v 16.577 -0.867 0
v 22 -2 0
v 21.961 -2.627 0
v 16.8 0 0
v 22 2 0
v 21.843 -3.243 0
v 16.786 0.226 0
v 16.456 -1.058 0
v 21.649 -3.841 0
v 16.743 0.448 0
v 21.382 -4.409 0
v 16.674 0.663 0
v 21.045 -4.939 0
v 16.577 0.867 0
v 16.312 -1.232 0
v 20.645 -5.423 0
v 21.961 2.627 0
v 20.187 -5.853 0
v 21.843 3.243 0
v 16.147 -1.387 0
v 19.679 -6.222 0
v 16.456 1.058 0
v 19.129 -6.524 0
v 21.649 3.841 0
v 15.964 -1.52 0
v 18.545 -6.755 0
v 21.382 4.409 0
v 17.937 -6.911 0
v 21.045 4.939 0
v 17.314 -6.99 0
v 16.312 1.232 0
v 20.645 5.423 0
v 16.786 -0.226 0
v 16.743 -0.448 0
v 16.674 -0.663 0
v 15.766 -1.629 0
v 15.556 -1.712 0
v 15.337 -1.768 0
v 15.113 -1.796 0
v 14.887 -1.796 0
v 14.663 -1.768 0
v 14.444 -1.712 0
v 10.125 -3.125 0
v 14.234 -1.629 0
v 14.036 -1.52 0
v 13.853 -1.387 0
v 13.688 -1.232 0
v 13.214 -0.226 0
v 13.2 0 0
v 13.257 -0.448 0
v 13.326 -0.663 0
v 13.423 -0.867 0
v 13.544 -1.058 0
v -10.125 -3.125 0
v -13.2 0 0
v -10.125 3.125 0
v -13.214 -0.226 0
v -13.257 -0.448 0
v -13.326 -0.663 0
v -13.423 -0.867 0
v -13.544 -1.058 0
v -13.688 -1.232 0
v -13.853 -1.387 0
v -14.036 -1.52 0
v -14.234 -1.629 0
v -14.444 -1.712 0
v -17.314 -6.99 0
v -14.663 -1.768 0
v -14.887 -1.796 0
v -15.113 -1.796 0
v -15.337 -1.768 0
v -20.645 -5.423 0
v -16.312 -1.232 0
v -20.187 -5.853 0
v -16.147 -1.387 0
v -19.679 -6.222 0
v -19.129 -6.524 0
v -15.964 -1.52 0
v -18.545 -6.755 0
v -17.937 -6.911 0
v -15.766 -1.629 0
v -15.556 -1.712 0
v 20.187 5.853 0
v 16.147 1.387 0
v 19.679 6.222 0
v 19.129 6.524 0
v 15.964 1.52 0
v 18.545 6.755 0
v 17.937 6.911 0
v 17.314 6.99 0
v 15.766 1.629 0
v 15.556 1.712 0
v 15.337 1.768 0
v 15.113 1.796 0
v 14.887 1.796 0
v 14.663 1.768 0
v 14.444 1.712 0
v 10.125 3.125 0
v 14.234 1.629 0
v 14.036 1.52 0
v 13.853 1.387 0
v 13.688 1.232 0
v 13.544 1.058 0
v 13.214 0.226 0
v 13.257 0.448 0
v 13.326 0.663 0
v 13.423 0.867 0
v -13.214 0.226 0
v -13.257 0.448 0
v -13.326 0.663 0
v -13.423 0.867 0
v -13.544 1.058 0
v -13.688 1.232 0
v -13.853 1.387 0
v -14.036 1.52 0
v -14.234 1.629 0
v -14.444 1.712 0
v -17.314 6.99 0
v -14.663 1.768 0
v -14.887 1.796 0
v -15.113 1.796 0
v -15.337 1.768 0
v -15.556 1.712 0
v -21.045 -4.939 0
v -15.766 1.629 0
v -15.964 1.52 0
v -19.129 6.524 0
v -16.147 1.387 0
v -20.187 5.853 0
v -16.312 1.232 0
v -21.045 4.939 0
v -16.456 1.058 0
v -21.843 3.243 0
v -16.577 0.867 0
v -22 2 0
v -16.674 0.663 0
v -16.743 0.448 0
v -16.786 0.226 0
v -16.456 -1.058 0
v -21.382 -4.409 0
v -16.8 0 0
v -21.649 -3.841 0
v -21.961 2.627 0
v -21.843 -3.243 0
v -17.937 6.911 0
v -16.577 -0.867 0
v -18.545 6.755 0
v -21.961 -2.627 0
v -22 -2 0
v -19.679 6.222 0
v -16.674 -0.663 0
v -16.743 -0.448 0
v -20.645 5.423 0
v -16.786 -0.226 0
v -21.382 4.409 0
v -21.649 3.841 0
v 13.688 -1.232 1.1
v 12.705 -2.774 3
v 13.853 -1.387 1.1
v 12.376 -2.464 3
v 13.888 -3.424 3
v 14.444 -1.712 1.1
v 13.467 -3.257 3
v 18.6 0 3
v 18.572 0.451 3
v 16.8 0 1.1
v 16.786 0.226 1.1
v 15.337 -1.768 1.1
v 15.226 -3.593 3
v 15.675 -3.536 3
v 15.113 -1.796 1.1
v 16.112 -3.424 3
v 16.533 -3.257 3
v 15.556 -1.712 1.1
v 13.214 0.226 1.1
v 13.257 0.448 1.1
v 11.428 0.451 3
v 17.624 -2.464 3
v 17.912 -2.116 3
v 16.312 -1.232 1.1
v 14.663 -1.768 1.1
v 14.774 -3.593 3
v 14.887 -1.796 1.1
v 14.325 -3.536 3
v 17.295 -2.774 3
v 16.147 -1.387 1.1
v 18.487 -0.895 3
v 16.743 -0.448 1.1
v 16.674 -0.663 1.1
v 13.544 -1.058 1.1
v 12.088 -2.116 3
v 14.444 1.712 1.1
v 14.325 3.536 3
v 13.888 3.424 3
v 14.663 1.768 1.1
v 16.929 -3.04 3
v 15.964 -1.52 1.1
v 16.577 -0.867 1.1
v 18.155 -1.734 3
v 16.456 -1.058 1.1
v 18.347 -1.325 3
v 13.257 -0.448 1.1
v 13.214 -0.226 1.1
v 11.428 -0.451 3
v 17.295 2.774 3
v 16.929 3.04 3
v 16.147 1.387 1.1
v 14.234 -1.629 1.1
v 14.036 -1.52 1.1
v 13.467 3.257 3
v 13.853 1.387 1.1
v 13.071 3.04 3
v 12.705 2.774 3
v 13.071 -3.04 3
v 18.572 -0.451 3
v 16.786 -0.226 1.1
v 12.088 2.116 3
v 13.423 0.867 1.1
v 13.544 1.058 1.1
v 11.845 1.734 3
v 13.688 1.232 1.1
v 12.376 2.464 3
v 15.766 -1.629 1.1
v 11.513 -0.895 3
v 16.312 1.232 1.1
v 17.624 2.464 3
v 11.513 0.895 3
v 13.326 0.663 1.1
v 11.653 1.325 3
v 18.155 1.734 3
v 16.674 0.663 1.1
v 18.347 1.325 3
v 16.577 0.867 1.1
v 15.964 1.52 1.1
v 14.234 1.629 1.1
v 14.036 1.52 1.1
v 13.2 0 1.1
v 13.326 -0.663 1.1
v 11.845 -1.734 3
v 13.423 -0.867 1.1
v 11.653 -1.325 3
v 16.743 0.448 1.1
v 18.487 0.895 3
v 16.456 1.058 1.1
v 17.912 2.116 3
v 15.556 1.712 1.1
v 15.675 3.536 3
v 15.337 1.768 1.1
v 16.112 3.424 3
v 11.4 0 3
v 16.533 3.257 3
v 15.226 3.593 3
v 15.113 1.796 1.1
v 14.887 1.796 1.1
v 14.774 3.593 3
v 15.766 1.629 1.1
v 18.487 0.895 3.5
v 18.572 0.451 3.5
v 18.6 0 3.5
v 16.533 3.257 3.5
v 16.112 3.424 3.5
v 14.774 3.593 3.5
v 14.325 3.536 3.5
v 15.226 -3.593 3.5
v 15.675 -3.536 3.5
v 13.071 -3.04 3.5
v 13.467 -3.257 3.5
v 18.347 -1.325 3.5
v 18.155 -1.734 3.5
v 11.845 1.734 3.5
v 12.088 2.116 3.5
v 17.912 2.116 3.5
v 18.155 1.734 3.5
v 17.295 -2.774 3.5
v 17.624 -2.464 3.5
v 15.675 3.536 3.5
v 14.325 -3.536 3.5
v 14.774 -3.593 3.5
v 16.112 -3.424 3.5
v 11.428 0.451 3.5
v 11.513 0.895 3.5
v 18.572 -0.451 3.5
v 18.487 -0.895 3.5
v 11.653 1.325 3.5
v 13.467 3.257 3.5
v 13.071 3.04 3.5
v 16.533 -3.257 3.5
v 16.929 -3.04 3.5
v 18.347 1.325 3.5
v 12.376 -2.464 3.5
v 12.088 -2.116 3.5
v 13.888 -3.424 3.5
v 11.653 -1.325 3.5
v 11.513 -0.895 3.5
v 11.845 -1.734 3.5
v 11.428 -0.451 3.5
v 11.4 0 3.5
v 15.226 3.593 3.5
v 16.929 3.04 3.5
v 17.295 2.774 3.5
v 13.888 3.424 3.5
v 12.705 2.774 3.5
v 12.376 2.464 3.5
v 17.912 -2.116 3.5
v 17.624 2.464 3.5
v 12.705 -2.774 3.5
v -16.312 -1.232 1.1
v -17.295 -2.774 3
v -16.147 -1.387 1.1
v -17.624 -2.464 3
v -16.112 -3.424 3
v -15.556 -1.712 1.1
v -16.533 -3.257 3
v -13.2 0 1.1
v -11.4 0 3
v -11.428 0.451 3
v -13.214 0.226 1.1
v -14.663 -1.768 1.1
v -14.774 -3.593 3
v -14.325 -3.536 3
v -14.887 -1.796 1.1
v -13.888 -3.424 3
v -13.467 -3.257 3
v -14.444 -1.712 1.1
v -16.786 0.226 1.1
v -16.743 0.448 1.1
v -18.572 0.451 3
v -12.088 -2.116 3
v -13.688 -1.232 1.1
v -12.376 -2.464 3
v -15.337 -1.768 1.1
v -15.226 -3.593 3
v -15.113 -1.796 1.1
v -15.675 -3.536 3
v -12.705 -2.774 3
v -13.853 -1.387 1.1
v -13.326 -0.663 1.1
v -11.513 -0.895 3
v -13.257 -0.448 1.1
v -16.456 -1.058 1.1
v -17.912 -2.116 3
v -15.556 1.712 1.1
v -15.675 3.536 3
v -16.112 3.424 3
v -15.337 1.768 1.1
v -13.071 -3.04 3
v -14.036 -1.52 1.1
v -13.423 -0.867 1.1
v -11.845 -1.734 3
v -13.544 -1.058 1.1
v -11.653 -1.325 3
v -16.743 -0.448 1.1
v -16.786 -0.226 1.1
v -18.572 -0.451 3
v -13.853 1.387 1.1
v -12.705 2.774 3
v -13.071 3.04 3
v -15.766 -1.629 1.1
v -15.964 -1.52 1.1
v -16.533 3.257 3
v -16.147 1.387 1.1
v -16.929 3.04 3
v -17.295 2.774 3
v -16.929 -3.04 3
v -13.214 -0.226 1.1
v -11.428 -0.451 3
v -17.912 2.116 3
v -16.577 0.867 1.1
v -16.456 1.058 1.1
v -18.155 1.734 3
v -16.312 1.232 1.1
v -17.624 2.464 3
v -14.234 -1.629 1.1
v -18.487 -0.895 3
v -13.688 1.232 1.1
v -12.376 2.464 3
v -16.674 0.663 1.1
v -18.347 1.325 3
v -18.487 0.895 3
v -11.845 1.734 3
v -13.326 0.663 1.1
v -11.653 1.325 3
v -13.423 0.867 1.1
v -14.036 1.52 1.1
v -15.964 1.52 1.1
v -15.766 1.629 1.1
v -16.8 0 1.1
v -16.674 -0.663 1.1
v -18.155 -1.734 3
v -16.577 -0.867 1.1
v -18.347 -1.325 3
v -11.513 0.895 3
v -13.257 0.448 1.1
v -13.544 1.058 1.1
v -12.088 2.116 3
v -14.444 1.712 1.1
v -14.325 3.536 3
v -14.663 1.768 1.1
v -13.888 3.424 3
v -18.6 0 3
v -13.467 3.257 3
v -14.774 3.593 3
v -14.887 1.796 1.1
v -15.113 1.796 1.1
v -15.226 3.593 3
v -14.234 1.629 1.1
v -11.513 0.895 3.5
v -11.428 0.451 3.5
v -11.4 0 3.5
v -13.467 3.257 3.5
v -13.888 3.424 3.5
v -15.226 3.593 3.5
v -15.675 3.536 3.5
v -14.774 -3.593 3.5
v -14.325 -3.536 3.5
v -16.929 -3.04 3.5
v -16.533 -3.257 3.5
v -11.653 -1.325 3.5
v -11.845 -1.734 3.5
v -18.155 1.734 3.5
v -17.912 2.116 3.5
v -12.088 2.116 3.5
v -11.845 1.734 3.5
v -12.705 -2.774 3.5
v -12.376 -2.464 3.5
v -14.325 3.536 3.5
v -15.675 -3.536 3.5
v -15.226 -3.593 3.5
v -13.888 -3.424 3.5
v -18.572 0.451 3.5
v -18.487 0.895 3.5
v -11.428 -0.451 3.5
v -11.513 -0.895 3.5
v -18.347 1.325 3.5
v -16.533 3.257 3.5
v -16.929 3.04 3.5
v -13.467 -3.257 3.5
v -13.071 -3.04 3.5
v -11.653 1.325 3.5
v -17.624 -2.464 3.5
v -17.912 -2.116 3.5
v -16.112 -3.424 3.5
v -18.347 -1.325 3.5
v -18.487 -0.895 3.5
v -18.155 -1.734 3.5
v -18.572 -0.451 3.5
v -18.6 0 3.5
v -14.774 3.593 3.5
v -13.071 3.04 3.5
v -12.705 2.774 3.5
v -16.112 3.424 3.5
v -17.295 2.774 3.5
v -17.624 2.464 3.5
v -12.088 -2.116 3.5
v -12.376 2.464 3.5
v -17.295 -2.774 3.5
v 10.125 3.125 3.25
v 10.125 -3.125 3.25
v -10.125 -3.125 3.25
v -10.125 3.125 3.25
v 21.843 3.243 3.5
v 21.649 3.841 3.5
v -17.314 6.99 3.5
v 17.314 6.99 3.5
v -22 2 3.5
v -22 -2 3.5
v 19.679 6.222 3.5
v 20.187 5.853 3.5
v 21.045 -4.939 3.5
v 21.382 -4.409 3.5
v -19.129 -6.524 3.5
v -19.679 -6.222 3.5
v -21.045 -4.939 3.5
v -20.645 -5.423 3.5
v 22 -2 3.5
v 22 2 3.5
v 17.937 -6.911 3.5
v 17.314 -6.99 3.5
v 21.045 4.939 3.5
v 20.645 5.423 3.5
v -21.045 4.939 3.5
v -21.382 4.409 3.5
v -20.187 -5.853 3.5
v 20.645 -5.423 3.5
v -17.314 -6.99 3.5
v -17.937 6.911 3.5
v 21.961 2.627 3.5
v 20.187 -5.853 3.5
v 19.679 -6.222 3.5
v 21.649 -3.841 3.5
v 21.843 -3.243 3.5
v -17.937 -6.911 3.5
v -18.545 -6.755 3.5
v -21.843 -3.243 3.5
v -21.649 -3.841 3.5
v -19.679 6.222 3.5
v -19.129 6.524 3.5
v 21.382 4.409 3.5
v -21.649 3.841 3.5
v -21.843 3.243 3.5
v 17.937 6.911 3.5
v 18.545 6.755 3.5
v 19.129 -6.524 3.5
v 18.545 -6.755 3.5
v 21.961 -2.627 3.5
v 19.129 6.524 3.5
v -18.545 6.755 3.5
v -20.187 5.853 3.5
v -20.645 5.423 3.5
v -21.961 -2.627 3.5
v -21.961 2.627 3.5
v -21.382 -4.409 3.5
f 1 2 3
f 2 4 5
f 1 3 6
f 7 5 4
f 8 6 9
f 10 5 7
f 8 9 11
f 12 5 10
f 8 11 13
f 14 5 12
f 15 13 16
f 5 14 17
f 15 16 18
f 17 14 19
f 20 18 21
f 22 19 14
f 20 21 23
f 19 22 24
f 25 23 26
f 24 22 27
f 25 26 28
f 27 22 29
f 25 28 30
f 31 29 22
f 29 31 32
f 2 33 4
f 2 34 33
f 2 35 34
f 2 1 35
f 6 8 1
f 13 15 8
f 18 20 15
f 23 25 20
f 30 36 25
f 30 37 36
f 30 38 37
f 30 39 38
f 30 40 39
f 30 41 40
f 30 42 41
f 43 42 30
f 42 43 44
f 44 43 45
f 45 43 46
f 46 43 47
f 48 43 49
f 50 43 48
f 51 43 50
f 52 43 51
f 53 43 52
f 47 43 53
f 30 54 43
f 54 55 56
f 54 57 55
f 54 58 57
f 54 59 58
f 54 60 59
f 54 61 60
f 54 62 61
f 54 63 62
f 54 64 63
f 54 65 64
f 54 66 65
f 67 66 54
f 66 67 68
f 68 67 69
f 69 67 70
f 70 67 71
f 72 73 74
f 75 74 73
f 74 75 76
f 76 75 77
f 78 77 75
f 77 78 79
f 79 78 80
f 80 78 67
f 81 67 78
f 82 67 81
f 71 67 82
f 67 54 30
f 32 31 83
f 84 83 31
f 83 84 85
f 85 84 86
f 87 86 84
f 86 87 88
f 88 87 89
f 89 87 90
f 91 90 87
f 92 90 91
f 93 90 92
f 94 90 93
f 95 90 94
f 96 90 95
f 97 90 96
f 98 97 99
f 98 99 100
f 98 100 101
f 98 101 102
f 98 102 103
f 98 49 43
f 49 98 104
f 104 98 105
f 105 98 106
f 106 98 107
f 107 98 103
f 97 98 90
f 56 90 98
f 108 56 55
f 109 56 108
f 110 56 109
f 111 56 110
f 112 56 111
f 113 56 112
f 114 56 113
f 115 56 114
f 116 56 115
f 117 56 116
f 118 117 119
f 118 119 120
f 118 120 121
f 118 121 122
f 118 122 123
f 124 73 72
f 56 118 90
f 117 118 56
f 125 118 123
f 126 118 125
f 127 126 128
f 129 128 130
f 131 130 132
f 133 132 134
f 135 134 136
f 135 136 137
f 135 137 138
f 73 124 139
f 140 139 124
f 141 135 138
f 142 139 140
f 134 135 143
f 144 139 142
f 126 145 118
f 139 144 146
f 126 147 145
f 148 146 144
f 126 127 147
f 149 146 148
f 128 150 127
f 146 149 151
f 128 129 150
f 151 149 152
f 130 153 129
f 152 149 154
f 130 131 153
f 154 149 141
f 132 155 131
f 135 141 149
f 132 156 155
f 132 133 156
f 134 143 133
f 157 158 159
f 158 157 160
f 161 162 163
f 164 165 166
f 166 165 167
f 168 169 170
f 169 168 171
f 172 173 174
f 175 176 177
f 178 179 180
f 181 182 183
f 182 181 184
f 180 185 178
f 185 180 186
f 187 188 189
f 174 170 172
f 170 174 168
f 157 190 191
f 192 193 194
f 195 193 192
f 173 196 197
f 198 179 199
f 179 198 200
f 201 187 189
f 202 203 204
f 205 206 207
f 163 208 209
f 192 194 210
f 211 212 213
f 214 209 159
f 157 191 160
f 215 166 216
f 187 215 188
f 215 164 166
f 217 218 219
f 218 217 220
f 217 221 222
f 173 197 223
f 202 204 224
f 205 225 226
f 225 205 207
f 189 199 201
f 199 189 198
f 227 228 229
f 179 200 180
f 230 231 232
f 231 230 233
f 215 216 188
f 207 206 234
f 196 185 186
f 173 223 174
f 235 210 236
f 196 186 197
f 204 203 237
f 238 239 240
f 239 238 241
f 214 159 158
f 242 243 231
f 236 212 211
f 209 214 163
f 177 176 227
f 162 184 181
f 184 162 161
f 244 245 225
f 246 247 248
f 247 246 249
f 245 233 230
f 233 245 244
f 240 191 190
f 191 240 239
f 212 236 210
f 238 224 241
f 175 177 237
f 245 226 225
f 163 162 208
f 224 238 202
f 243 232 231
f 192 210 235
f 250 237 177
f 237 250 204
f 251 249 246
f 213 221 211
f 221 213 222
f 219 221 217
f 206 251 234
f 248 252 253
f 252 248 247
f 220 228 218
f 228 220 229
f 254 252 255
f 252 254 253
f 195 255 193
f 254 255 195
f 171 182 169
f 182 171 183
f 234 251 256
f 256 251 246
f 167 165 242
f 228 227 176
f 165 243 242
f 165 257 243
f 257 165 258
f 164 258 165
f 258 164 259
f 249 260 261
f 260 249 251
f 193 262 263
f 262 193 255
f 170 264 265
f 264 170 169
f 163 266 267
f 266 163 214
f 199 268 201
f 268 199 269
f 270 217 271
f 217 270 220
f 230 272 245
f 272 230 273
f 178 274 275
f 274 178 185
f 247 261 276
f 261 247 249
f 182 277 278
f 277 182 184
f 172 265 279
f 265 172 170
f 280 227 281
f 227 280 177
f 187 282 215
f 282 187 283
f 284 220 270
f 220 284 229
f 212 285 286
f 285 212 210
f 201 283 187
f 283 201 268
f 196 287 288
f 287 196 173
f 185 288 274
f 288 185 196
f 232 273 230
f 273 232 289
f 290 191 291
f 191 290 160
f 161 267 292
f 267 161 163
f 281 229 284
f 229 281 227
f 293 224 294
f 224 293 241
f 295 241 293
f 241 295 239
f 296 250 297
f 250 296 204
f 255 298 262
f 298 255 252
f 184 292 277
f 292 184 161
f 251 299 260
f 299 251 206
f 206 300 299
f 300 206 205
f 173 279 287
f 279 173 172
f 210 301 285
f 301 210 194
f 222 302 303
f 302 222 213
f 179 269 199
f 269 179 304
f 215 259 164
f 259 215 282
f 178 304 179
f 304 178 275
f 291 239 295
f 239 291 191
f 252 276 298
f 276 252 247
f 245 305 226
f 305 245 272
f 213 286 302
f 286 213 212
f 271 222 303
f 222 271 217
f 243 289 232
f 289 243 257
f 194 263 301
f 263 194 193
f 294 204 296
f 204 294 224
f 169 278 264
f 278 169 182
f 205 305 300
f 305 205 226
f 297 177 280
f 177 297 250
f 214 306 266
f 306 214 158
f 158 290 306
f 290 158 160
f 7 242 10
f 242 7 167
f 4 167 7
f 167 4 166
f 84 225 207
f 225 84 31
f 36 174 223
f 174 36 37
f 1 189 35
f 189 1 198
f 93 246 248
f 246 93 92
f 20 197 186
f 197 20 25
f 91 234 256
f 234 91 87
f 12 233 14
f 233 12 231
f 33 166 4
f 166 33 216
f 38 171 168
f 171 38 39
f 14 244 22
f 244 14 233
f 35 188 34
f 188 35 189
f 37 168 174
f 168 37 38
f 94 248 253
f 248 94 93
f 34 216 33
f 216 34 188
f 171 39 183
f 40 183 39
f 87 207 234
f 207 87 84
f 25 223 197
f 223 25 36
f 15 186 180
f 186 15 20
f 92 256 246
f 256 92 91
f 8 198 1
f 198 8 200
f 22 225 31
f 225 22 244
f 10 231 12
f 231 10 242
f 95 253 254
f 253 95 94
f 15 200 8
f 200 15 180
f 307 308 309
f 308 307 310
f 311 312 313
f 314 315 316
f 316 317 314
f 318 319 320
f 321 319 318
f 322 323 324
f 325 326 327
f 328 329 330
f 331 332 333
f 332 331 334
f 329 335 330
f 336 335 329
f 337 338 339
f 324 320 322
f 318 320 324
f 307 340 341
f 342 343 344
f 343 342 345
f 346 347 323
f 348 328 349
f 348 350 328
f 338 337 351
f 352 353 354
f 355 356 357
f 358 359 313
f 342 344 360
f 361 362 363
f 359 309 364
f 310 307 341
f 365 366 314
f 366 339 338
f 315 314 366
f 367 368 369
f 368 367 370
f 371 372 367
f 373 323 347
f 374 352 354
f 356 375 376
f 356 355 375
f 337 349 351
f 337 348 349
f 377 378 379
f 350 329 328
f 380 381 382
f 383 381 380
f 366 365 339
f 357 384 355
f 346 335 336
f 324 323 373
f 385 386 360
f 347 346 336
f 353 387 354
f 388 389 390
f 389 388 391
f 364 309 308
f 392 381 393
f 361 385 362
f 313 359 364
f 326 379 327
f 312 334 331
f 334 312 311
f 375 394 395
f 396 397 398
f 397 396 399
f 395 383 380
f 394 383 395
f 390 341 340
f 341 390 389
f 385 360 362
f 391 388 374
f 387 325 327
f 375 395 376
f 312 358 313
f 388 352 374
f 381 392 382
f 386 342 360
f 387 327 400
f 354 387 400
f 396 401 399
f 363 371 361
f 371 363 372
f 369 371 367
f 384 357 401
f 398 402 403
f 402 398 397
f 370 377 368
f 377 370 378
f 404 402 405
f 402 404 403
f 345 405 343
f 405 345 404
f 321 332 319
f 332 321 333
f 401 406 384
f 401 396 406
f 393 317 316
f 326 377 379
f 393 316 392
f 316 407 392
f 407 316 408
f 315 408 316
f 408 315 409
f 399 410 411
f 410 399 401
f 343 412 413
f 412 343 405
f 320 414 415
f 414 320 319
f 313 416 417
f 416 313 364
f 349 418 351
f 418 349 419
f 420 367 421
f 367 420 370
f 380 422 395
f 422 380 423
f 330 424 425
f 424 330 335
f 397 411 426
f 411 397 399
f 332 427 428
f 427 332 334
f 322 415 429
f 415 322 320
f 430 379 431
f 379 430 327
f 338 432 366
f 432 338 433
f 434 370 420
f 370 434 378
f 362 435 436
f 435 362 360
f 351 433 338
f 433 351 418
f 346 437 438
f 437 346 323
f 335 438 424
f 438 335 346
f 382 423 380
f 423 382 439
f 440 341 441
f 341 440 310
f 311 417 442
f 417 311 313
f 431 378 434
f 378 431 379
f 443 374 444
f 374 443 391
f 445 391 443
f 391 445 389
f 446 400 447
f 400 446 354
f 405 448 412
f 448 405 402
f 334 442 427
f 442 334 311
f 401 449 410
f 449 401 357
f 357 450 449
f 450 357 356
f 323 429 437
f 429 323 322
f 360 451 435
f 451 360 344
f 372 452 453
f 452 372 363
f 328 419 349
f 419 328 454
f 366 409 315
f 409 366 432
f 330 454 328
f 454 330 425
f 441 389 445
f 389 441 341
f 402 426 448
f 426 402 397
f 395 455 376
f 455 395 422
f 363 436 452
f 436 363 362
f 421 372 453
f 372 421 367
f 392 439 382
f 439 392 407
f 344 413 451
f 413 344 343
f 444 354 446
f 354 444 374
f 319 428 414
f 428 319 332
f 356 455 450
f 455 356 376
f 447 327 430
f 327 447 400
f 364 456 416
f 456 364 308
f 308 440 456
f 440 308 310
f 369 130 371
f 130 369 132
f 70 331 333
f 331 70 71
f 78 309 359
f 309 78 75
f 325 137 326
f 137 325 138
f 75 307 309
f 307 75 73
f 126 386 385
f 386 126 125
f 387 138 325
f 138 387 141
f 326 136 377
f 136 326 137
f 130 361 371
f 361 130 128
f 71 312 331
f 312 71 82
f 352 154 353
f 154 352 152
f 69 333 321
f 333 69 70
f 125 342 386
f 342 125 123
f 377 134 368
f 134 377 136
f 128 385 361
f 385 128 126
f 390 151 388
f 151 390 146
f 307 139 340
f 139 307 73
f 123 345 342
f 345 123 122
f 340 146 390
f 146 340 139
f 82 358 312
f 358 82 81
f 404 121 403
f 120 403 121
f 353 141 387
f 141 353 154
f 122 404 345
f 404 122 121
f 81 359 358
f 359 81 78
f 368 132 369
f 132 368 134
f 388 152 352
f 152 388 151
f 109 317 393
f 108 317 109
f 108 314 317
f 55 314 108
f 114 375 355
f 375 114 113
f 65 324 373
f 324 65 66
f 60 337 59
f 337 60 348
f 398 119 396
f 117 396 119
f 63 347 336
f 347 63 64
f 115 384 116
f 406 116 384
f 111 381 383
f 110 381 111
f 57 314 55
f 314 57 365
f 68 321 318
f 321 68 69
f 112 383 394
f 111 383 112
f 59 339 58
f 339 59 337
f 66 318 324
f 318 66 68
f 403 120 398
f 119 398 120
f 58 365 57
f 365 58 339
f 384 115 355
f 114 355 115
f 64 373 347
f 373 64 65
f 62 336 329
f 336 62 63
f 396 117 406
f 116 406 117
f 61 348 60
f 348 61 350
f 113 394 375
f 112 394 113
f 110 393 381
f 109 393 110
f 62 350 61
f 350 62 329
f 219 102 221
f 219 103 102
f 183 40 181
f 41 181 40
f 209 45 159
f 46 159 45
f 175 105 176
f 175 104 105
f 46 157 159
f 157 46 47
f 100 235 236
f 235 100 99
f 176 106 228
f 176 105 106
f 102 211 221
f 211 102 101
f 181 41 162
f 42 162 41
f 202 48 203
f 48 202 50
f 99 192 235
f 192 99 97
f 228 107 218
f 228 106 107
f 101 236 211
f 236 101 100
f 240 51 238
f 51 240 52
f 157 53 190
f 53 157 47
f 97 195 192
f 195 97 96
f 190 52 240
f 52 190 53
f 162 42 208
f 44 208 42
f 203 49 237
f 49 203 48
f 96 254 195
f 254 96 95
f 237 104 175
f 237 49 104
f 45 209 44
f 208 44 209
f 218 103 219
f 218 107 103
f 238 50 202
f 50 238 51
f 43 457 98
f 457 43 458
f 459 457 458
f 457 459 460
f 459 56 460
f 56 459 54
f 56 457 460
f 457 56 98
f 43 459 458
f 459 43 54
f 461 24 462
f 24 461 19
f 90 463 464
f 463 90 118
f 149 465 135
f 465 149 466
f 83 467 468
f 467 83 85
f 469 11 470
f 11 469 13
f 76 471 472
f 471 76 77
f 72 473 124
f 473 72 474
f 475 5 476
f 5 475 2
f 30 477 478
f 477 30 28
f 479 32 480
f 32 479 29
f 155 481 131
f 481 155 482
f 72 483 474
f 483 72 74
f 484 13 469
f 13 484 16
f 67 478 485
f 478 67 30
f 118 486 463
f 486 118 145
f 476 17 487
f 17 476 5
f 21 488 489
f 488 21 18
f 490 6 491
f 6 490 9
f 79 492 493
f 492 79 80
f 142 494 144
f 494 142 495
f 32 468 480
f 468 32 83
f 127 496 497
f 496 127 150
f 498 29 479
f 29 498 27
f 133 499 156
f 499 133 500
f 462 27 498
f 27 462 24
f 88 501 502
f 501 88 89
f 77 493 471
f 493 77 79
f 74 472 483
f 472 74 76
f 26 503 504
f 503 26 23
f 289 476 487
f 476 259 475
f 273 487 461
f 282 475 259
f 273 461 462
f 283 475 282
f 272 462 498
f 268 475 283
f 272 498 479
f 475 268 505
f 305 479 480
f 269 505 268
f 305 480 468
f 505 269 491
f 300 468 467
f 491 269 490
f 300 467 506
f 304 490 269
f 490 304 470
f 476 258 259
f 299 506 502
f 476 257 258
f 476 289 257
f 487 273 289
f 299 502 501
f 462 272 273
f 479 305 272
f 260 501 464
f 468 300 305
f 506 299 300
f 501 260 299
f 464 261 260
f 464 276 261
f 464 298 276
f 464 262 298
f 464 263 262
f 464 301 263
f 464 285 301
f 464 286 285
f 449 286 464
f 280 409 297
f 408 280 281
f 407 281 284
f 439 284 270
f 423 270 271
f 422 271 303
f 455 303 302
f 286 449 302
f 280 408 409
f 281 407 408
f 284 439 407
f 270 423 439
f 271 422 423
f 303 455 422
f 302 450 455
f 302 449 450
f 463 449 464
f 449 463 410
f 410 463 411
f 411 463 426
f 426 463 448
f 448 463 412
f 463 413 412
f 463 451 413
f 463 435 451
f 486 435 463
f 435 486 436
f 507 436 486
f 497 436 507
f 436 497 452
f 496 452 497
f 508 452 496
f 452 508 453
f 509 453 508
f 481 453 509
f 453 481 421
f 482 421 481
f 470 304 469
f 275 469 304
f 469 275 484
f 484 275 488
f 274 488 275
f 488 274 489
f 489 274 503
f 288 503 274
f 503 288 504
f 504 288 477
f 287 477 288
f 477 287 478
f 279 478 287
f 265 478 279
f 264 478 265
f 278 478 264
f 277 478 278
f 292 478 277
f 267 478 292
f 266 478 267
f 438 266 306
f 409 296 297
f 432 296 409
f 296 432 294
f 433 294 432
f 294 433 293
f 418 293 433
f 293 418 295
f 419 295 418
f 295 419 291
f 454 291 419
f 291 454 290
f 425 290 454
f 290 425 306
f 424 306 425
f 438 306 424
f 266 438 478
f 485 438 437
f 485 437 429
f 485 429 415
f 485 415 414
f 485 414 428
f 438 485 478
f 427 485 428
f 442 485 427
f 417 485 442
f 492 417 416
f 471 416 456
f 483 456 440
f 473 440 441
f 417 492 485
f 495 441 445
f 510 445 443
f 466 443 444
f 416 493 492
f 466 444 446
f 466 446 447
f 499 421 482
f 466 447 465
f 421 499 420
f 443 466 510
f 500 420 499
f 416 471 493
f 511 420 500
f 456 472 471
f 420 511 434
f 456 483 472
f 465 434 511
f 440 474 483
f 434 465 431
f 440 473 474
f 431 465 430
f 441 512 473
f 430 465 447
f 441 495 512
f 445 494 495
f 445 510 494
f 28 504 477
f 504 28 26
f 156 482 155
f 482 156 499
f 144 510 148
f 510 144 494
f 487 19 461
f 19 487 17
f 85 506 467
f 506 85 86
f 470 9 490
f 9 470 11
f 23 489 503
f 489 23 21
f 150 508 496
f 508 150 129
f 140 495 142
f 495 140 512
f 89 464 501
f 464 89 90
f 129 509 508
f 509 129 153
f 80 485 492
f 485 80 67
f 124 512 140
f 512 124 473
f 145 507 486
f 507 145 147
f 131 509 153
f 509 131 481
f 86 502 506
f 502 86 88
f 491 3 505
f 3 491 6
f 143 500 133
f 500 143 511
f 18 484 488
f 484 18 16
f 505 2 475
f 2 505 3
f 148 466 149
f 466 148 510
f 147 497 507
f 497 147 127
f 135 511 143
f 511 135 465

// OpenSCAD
$fn = 50;


difference() {
	union() {
		hull() {
			translate(v = [-17.0000000000, 2.0000000000, 0]) {
				cylinder(h = 3.5000000000, r = 5);
			}
			translate(v = [17.0000000000, 2.0000000000, 0]) {
				cylinder(h = 3.5000000000, r = 5);
			}
			translate(v = [-17.0000000000, -2.0000000000, 0]) {
				cylinder(h = 3.5000000000, r = 5);
			}
			translate(v = [17.0000000000, -2.0000000000, 0]) {
				cylinder(h = 3.5000000000, r = 5);
			}
		}
	}
	union() {
		translate(v = [15.0000000000, 0, 3.0000000000]) {
			rotate(a = [0, 0, 0]) {
				difference() {
					union() {
						translate(v = [0, 0, -3.0000000000]) {
							cylinder(h = 3.0000000000, r = 1.5000000000);
						}
						translate(v = [0, 0, -1.9000000000]) {
							cylinder(h = 1.9000000000, r1 = 1.8000000000, r2 = 3.6000000000);
						}
						cylinder(h = 250, r = 3.6000000000);
						translate(v = [0, 0, -3.0000000000]) {
							cylinder(h = 3.0000000000, r = 1.8000000000);
						}
						translate(v = [0, 0, -3.0000000000]) {
							cylinder(h = 3.0000000000, r = 1.5000000000);
						}
					}
					union();
				}
			}
		}
		translate(v = [-15.0000000000, 0, 3.0000000000]) {
			rotate(a = [0, 0, 0]) {
				difference() {
					union() {
						translate(v = [0, 0, -3.0000000000]) {
							cylinder(h = 3.0000000000, r = 1.5000000000);
						}
						translate(v = [0, 0, -1.9000000000]) {
							cylinder(h = 1.9000000000, r1 = 1.8000000000, r2 = 3.6000000000);
						}
						cylinder(h = 250, r = 3.6000000000);
						translate(v = [0, 0, -3.0000000000]) {
							cylinder(h = 3.0000000000, r = 1.8000000000);
						}
						translate(v = [0, 0, -3.0000000000]) {
							cylinder(h = 3.0000000000, r = 1.5000000000);
						}
					}
					union();
				}
			}
		}
		translate(v = [-15.0000000000, 0.0000000000, 0]) {
			cylinder(h = 3.5000000000, r = 1.8000000000);
		}
		translate(v = [15.0000000000, 0.0000000000, 0]) {
			cylinder(h = 3.5000000000, r = 1.8000000000);
		}
		translate(v = [-15.0000000000, 0.0000000000, 0]) {
			cylinder(h = 3.5000000000, r = 1.8000000000);
		}
		translate(v = [15.0000000000, 0.0000000000, 0]) {
			cylinder(h = 3.5000000000, r = 1.8000000000);
		}
		translate(v = [-15.0000000000, 0.0000000000, 0]) {
			cylinder(h = 3.5000000000, r = 1.8000000000);
		}
		translate(v = [15.0000000000, 0.0000000000, 0]) {
			cylinder(h = 3.5000000000, r = 1.8000000000);
		}
		translate(v = [-15.0000000000, 0.0000000000, 0]) {
			cylinder(h = 3.5000000000, r = 1.8000000000);
		}
		translate(v = [15.0000000000, 0.0000000000, 0]) {
			cylinder(h = 3.5000000000, r = 1.8000000000);
		}
		#translate(v = [-10.1250000000, -3.1250000000, 0]) {
			cube(size = [20.2500000000, 6.2500000000, 3.2500000000]);
		}
	}
}
